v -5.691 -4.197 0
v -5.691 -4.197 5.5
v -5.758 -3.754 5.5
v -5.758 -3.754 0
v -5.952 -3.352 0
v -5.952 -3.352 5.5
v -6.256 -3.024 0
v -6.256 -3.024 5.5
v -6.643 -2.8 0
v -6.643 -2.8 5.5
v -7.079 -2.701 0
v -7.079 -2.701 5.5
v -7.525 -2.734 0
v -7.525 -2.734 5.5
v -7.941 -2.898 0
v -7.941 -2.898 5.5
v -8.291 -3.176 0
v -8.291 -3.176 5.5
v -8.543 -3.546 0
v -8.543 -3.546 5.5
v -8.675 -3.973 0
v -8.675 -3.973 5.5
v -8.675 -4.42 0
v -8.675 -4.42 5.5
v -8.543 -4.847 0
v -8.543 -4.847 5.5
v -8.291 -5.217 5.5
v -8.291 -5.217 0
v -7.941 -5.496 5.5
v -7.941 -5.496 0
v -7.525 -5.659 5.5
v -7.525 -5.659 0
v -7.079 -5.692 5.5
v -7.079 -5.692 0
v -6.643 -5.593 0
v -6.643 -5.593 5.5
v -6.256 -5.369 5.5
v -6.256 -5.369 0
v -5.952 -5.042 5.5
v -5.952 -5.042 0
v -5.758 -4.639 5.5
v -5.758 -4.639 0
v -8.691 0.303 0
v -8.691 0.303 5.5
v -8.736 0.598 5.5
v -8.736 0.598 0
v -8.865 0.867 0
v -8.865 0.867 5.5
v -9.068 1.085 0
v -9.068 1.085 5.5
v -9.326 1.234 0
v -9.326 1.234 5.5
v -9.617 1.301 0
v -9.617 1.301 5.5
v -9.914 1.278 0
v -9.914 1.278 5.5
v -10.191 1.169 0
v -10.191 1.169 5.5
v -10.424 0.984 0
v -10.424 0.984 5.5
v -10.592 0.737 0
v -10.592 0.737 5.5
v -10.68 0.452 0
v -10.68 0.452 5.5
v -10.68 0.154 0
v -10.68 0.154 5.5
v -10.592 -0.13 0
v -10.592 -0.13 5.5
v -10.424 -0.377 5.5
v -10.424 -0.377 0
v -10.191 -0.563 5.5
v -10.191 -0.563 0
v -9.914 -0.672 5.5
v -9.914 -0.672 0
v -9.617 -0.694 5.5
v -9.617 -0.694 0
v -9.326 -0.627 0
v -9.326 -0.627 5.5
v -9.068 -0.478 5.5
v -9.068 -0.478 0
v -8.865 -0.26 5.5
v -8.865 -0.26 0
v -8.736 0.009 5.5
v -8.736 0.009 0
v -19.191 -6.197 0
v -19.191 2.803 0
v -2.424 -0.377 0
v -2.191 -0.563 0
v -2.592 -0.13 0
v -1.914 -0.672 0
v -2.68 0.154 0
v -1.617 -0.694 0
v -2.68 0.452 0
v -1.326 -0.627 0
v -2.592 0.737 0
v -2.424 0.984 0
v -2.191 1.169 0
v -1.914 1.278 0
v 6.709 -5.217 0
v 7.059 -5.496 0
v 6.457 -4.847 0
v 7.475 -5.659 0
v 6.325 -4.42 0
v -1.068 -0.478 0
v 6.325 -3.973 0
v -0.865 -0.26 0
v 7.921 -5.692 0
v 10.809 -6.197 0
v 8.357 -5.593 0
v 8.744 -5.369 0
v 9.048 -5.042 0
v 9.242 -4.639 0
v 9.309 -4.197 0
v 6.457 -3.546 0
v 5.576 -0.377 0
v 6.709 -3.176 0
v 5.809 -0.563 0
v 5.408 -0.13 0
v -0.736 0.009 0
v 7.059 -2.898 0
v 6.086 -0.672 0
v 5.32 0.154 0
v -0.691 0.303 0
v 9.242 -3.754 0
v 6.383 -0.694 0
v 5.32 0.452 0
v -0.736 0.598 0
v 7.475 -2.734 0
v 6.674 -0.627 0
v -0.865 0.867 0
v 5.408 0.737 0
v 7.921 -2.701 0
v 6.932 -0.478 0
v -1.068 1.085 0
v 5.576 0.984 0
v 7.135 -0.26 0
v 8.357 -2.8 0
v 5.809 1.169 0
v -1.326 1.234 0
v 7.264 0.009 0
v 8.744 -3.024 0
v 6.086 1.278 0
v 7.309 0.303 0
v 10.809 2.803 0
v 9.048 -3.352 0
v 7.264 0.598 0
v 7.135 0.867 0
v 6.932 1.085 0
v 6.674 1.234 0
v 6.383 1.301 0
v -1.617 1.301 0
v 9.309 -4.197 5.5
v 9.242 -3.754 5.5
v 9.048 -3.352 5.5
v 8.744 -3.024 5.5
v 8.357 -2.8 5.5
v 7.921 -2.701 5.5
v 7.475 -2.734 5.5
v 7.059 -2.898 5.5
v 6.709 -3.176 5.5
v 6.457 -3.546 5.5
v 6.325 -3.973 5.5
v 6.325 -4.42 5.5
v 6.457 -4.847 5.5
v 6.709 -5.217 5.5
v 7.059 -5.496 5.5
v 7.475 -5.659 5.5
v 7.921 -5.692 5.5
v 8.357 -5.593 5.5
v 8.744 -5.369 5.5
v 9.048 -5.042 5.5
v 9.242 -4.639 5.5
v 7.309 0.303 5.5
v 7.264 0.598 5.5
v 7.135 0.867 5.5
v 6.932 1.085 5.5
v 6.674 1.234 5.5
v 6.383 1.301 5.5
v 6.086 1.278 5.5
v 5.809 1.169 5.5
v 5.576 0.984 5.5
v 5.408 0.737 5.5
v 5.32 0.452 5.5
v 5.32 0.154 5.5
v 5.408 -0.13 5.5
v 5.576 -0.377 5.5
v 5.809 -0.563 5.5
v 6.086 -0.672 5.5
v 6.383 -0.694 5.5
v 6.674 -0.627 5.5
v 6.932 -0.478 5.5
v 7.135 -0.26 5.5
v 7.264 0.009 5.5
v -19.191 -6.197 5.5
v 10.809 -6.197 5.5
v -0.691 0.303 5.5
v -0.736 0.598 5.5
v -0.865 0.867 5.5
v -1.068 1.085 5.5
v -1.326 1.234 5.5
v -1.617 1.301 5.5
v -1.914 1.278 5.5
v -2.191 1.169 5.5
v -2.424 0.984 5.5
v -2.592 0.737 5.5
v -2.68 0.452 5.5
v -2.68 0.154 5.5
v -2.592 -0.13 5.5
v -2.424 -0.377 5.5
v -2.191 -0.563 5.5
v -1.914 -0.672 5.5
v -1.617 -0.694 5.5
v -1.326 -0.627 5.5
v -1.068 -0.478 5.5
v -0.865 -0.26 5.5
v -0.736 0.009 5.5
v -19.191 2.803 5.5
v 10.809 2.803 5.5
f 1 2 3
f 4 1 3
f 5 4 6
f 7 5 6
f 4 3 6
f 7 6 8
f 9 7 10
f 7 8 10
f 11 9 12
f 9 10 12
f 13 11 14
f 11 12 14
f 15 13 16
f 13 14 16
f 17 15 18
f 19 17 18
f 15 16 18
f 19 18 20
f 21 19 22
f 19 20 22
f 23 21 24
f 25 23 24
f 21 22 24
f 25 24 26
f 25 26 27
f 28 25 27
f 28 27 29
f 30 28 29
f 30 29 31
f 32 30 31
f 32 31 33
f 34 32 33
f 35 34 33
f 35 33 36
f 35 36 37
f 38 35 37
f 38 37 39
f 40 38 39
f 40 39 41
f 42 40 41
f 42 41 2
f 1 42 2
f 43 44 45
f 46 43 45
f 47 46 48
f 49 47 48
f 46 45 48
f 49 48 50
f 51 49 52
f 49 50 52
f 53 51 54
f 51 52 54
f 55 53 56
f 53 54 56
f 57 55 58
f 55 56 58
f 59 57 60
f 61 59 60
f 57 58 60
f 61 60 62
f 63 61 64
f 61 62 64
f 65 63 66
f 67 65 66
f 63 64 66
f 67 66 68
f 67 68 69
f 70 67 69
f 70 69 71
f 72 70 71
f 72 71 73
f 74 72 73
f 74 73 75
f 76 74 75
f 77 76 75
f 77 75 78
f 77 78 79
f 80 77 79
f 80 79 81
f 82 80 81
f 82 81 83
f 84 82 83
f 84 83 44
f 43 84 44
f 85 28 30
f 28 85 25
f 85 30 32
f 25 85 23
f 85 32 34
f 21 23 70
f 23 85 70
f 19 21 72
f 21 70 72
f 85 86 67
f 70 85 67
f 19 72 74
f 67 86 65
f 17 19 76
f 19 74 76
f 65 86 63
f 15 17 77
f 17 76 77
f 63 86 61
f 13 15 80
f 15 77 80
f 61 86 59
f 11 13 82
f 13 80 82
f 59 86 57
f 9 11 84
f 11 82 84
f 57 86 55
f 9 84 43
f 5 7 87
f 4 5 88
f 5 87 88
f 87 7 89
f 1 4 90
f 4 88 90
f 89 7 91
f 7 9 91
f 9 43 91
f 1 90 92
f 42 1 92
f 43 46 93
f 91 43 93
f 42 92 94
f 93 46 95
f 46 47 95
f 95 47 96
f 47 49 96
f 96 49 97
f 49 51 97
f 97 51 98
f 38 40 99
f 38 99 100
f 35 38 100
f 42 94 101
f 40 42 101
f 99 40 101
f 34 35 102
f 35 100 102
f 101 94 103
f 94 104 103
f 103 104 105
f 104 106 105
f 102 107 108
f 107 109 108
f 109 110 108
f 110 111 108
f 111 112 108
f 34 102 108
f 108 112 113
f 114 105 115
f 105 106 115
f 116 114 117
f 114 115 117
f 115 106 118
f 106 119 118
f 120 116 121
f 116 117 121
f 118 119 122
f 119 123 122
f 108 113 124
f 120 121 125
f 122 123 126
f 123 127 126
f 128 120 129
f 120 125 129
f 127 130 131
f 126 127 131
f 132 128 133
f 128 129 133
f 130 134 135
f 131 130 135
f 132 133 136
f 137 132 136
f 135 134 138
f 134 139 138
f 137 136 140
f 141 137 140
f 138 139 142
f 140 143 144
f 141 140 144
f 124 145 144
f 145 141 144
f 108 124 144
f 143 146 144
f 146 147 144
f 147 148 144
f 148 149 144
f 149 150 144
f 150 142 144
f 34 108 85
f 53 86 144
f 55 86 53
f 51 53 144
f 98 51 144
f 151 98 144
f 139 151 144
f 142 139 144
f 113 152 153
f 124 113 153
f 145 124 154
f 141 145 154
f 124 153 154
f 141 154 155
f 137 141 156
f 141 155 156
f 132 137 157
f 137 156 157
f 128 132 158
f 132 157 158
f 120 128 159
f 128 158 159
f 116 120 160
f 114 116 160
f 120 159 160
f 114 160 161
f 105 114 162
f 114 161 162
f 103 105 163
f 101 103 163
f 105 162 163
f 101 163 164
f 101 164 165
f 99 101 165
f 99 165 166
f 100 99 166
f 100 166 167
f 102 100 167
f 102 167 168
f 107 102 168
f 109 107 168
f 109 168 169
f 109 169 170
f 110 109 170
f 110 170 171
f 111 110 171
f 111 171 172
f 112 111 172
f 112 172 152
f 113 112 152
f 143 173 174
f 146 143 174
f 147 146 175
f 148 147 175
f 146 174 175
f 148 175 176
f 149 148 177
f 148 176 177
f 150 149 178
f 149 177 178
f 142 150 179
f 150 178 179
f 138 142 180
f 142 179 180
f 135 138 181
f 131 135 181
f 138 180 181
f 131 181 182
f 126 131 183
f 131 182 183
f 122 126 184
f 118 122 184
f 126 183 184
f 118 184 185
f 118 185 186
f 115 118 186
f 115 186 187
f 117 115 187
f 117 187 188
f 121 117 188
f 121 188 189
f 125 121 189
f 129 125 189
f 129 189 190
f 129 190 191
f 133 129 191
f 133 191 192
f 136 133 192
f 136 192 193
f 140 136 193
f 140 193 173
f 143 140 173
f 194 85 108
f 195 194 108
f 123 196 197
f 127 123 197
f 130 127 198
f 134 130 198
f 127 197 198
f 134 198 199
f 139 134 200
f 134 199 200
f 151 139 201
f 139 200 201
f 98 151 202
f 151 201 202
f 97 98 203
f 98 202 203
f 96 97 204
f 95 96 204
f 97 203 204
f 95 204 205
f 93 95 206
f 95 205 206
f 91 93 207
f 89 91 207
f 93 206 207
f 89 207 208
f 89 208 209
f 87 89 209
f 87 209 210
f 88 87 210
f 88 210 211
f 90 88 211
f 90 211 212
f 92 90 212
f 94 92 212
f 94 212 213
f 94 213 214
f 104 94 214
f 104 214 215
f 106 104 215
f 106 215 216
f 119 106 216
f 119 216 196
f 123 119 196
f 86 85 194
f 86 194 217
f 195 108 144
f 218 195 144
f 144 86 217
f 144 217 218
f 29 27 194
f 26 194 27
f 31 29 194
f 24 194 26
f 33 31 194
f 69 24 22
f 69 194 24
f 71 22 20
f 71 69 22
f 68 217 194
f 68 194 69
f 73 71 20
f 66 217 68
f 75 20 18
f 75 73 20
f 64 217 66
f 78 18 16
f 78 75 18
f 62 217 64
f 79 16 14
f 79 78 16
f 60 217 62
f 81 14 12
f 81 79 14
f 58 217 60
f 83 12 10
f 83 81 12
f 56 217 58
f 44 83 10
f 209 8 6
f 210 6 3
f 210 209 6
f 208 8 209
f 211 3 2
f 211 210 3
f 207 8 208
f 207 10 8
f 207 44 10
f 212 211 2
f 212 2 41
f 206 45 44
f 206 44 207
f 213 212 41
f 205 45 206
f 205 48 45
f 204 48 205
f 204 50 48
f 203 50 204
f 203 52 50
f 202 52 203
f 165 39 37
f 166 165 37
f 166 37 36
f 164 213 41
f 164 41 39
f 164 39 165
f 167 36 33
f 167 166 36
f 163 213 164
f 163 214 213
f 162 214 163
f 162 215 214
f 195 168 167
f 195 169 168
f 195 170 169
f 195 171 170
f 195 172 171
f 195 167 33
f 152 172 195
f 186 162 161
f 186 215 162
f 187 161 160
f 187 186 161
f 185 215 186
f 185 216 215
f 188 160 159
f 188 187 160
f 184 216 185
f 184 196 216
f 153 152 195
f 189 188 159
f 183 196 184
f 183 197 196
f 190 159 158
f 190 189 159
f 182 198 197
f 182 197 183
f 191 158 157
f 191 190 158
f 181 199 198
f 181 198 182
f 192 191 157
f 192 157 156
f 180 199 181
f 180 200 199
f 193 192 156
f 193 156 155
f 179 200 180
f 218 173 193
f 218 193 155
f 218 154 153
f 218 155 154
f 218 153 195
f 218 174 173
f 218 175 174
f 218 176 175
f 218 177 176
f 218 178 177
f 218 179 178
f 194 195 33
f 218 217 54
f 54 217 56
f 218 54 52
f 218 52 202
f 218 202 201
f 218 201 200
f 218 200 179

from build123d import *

# Parameters (mm, degrees)
ESQUISSE1_W             = 30
ESQUISSE1_H             = 9
BOSS_EXTRU_1_DEPTH      = 5.5
ESQUISSE3_R             = 1
ENL_V_MAT_EXTRU_2_DEPTH = 6.5
ESQUISSE4_R             = 1.5
ENL_V_MAT_EXTRU_3_DEPTH = 10


with BuildPart() as part:
    # Esquisse1 → Boss.-Extru.1 (new body)
    with BuildSketch(Plane.XY):
        with Locations((-4.19131449, -1.696581197)):
            Rectangle(ESQUISSE1_W, ESQUISSE1_H)
    extrude(amount=BOSS_EXTRU_1_DEPTH)

    # Esquisse3 → Enlèv. mat.-Extru.2 (cut, through all)
    with BuildSketch(Plane.XY.offset(5.5)):
        with Locations((6.30868551, 0.303418803)):
            Circle(ESQUISSE3_R)
        with Locations((-1.69131449, 0.303418803)):
            Circle(ESQUISSE3_R)
        with Locations((-9.69131449, 0.303418803)):
            Circle(ESQUISSE3_R)
    extrude(amount=-ENL_V_MAT_EXTRU_2_DEPTH, mode=Mode.SUBTRACT)

    # Esquisse4 → Enlèv. mat.-Extru.3 (cut)
    with BuildSketch(Plane.XY.offset(5.5)):
        with Locations((-7.19131449, -4.196581197)):
            Circle(ESQUISSE4_R)
        with Locations((7.80868551, -4.196581197)):
            Circle(ESQUISSE4_R)
    extrude(amount=-ENL_V_MAT_EXTRU_3_DEPTH, mode=Mode.SUBTRACT)


solid = part.part
